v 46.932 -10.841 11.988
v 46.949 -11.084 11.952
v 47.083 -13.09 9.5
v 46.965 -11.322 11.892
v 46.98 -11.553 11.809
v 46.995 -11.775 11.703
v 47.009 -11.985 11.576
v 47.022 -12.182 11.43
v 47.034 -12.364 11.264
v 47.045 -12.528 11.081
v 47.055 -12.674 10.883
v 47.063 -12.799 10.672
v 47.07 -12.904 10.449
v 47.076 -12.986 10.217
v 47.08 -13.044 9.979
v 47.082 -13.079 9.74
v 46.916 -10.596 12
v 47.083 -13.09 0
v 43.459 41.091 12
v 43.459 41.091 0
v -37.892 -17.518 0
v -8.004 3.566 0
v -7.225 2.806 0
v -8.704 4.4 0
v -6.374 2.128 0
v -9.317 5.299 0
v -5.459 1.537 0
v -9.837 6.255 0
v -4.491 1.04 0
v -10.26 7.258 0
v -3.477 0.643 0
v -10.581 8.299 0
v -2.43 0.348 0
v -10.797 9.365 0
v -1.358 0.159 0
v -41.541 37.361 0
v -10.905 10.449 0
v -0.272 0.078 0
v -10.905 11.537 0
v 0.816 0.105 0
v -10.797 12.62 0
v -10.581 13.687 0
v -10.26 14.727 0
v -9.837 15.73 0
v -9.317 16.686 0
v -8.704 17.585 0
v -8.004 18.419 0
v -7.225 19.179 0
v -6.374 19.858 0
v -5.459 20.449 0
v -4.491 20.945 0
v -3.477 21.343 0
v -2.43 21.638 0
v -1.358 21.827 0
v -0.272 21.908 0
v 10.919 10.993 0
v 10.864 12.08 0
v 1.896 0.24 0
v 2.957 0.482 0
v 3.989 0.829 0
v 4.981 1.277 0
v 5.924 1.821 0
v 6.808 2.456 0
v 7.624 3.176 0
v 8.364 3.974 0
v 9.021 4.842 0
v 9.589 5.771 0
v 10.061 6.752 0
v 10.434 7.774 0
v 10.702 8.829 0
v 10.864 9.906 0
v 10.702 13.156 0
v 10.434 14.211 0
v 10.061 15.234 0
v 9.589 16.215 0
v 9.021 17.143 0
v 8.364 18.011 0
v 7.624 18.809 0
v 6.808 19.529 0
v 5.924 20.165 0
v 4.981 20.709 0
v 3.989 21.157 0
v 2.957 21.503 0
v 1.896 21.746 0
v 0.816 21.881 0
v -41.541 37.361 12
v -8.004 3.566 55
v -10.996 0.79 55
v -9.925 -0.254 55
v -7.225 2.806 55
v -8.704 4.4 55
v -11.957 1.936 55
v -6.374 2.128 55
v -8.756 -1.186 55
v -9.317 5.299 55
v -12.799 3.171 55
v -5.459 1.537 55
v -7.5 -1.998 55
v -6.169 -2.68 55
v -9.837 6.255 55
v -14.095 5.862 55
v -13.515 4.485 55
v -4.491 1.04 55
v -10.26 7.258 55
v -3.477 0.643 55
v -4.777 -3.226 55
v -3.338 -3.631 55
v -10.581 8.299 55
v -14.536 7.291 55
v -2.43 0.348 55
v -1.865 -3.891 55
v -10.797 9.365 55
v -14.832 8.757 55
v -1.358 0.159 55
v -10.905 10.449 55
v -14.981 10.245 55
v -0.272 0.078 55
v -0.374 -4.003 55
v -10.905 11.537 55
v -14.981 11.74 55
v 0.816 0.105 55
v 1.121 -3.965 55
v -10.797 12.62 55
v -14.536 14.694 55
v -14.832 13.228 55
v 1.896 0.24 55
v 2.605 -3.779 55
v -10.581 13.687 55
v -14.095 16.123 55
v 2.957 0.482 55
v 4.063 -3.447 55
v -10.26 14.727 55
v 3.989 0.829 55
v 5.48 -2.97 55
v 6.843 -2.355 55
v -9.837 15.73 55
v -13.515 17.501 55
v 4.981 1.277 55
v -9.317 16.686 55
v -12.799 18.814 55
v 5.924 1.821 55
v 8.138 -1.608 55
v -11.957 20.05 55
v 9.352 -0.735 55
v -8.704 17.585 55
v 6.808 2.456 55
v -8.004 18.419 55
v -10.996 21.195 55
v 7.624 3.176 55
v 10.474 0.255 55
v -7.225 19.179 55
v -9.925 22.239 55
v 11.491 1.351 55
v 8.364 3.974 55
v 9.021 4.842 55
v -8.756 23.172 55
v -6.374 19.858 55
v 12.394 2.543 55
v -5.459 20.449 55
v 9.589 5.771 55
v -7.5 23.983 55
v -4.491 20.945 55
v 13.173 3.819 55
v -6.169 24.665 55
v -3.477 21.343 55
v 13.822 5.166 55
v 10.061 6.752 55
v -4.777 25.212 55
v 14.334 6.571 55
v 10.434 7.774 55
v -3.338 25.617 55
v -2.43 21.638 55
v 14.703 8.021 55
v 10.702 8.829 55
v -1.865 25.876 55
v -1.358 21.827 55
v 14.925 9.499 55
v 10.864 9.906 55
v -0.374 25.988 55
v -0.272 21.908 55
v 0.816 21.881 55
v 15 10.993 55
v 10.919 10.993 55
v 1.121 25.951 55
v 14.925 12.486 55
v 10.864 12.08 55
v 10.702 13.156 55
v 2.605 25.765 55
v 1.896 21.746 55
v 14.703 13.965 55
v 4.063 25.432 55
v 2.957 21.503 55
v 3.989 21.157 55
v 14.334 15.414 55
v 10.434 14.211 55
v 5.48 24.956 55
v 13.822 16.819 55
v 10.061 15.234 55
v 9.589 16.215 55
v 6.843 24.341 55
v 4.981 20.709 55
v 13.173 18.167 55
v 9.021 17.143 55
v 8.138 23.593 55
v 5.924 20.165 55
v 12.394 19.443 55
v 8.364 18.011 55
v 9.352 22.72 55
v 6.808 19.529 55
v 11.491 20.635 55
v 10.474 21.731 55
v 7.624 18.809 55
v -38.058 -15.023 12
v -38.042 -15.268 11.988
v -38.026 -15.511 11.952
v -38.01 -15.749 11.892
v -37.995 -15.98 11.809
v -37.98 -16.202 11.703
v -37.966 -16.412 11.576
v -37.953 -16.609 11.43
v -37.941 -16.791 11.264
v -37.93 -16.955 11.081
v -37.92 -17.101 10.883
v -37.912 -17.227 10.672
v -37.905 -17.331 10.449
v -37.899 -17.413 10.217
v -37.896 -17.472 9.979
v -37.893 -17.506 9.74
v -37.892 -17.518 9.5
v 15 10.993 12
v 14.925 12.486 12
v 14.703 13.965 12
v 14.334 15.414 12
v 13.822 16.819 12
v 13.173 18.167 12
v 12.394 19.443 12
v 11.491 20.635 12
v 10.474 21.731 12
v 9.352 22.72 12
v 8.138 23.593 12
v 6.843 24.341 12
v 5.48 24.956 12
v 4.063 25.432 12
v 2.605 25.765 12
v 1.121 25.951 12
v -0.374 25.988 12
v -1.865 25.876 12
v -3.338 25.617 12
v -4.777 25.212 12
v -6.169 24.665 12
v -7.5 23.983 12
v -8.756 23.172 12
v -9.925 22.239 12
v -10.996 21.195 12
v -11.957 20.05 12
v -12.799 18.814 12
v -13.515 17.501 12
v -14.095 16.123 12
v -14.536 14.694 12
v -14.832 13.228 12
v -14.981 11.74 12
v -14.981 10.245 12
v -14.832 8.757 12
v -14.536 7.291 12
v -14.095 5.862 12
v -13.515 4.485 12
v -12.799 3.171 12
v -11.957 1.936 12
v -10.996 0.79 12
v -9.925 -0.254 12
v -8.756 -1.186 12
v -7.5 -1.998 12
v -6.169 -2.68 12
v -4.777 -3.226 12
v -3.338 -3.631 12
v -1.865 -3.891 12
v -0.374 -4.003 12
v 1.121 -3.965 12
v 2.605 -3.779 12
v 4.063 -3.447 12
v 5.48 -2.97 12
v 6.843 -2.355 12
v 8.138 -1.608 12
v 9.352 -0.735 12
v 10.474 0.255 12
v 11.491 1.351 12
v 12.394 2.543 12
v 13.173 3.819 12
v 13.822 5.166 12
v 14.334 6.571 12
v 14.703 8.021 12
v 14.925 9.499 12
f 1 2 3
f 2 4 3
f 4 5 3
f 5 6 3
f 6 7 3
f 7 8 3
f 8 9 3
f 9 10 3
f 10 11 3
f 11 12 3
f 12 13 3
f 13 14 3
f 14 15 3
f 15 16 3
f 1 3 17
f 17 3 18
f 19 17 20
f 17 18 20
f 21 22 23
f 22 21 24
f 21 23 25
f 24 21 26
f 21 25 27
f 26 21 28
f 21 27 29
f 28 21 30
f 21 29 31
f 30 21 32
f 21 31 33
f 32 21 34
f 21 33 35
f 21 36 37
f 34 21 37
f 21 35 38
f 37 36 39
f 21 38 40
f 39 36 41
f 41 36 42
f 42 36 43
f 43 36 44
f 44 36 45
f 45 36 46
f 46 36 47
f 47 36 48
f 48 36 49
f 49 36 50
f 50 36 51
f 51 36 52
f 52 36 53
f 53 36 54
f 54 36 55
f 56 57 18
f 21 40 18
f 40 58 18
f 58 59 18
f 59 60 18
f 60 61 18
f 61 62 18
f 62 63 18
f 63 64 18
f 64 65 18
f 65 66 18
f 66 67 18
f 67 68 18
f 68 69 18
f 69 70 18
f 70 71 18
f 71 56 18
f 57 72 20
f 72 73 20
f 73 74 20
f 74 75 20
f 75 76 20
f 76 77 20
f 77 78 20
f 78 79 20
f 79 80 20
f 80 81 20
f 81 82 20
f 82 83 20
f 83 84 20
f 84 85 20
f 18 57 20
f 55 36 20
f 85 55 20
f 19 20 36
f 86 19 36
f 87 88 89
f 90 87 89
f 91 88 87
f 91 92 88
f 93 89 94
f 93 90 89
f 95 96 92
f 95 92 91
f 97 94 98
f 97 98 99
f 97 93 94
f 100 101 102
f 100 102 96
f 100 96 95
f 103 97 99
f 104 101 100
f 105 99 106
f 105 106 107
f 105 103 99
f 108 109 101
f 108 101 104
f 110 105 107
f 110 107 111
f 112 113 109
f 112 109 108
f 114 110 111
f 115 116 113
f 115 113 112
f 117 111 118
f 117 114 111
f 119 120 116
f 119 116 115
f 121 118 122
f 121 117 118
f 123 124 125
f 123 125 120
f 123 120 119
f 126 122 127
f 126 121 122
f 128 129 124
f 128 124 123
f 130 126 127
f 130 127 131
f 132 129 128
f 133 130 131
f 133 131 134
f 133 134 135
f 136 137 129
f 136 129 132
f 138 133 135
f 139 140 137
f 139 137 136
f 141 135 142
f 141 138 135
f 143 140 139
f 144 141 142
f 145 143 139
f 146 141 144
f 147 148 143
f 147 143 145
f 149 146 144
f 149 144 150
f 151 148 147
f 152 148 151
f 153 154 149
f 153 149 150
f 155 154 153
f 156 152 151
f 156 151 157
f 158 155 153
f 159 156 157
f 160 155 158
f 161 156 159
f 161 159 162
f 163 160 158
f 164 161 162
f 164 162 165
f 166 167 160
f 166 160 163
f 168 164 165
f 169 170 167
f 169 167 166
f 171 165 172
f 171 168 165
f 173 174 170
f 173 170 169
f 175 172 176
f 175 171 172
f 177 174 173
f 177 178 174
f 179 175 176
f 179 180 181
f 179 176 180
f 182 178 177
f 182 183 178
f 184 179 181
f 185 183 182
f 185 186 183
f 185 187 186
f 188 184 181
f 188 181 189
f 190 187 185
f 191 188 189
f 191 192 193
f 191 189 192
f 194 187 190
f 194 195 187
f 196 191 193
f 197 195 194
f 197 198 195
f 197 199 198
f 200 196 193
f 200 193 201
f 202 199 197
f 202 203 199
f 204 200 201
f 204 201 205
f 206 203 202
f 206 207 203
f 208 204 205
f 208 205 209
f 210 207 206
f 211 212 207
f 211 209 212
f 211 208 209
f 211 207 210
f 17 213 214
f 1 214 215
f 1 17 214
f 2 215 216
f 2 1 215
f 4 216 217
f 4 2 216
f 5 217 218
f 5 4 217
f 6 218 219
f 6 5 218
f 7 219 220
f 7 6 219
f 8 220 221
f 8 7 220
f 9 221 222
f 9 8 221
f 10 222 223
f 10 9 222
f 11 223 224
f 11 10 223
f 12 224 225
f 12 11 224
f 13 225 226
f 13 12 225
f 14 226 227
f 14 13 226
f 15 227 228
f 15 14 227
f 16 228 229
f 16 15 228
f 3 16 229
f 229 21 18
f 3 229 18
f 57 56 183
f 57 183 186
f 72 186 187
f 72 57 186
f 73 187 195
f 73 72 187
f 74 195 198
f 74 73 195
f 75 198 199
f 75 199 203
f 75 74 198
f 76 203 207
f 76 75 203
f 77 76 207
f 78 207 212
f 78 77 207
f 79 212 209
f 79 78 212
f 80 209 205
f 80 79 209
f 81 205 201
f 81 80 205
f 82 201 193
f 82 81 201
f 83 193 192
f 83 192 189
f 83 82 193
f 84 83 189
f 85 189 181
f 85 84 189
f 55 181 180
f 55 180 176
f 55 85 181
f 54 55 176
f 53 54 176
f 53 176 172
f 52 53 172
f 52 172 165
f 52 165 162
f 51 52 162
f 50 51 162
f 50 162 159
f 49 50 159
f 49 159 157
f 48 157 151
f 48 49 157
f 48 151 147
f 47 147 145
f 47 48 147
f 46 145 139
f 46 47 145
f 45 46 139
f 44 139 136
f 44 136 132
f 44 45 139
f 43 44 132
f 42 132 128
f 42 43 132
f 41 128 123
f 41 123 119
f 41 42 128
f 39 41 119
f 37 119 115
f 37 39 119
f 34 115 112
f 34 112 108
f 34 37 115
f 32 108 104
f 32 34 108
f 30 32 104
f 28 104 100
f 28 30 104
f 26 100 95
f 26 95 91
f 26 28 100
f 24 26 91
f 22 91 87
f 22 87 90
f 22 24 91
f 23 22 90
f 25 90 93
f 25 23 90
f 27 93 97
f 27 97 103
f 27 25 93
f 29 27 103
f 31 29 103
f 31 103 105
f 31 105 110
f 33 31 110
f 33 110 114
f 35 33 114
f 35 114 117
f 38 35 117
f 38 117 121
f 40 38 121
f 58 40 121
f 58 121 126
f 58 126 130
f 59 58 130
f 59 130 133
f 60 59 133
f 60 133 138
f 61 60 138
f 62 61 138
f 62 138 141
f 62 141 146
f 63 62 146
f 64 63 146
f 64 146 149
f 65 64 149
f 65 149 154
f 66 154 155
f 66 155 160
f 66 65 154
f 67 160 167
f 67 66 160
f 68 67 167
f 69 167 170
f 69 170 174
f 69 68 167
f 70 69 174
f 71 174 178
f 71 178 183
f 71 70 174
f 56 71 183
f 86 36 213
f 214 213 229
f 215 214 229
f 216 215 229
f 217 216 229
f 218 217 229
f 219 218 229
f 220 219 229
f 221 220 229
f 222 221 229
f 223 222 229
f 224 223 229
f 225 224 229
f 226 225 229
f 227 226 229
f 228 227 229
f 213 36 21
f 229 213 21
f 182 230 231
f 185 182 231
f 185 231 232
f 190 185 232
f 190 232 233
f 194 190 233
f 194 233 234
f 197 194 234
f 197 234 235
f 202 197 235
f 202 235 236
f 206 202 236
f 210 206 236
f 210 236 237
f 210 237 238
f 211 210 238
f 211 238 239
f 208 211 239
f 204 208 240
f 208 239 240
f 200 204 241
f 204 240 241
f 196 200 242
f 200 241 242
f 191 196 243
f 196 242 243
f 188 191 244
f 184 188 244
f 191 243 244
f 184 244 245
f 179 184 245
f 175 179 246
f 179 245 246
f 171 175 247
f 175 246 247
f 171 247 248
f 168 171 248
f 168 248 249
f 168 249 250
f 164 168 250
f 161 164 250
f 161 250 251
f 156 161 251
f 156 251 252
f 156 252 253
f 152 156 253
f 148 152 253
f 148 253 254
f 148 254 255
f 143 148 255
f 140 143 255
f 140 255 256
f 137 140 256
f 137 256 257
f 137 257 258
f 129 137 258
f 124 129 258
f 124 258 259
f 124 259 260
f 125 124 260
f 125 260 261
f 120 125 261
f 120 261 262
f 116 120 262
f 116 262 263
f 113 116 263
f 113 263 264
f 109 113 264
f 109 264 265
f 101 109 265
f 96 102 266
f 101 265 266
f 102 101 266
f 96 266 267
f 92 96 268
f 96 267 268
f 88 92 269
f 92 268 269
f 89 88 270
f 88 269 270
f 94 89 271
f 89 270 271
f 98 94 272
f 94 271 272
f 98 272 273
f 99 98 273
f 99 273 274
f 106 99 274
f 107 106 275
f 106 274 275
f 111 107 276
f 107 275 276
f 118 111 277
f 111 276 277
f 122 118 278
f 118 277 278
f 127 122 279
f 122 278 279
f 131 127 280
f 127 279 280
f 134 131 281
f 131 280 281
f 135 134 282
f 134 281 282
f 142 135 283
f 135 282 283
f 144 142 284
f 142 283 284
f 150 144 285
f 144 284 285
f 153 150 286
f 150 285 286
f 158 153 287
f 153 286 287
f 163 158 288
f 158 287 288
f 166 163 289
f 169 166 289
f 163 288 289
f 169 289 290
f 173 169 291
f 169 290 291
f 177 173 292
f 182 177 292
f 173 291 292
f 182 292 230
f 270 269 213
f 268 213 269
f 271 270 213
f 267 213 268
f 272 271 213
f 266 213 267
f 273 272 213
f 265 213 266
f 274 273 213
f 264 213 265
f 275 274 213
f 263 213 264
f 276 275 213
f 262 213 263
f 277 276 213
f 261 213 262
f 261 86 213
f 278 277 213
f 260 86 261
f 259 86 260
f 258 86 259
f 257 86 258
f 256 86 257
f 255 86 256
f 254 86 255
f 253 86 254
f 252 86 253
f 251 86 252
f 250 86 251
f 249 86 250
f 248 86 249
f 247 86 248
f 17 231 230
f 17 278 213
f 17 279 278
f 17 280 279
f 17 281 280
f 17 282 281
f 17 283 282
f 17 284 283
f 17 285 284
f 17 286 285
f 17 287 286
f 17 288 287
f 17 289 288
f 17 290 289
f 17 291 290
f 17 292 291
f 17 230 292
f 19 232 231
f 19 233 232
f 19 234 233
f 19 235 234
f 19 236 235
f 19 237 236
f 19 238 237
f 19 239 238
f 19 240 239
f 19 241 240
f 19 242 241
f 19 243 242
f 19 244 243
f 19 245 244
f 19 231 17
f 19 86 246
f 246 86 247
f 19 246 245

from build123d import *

# Parameters (mm, degrees)
F0_R     = 15
F1_DEPTH = 12
F0_R_2   = 10.918635
F2_DEPTH = 55
F3_R     = 2.5


with BuildPart() as f1:
    # F0 (on Top) → F1 (new body)
    with BuildSketch(Plane.XY):
        Polygon((43.459415, 41.090946), (-41.540585, 37.36122), (-37.89244, -17.517657), (47.082786, -13.090479), align=None)
        with Locations((0, 10.992759)):
            Circle(F0_R, mode=Mode.SUBTRACT)
    extrude(amount=F1_DEPTH)

    # F0 (on Top) → F2 (join)
    with BuildSketch(Plane.XY):
        with Locations((0, 10.992759)):
            Circle(F0_R)
        with Locations((0, 10.992759)):
            Circle(F0_R_2, mode=Mode.SUBTRACT)
    extrude(amount=F2_DEPTH)

    # F3
    f3_edges = [f1.edges().sort_by_distance(p)[0] for p in [
        (4.595173, -15.304068, 12),
    ]]
    fillet(f3_edges, radius=F3_R)


solid = f1.part
